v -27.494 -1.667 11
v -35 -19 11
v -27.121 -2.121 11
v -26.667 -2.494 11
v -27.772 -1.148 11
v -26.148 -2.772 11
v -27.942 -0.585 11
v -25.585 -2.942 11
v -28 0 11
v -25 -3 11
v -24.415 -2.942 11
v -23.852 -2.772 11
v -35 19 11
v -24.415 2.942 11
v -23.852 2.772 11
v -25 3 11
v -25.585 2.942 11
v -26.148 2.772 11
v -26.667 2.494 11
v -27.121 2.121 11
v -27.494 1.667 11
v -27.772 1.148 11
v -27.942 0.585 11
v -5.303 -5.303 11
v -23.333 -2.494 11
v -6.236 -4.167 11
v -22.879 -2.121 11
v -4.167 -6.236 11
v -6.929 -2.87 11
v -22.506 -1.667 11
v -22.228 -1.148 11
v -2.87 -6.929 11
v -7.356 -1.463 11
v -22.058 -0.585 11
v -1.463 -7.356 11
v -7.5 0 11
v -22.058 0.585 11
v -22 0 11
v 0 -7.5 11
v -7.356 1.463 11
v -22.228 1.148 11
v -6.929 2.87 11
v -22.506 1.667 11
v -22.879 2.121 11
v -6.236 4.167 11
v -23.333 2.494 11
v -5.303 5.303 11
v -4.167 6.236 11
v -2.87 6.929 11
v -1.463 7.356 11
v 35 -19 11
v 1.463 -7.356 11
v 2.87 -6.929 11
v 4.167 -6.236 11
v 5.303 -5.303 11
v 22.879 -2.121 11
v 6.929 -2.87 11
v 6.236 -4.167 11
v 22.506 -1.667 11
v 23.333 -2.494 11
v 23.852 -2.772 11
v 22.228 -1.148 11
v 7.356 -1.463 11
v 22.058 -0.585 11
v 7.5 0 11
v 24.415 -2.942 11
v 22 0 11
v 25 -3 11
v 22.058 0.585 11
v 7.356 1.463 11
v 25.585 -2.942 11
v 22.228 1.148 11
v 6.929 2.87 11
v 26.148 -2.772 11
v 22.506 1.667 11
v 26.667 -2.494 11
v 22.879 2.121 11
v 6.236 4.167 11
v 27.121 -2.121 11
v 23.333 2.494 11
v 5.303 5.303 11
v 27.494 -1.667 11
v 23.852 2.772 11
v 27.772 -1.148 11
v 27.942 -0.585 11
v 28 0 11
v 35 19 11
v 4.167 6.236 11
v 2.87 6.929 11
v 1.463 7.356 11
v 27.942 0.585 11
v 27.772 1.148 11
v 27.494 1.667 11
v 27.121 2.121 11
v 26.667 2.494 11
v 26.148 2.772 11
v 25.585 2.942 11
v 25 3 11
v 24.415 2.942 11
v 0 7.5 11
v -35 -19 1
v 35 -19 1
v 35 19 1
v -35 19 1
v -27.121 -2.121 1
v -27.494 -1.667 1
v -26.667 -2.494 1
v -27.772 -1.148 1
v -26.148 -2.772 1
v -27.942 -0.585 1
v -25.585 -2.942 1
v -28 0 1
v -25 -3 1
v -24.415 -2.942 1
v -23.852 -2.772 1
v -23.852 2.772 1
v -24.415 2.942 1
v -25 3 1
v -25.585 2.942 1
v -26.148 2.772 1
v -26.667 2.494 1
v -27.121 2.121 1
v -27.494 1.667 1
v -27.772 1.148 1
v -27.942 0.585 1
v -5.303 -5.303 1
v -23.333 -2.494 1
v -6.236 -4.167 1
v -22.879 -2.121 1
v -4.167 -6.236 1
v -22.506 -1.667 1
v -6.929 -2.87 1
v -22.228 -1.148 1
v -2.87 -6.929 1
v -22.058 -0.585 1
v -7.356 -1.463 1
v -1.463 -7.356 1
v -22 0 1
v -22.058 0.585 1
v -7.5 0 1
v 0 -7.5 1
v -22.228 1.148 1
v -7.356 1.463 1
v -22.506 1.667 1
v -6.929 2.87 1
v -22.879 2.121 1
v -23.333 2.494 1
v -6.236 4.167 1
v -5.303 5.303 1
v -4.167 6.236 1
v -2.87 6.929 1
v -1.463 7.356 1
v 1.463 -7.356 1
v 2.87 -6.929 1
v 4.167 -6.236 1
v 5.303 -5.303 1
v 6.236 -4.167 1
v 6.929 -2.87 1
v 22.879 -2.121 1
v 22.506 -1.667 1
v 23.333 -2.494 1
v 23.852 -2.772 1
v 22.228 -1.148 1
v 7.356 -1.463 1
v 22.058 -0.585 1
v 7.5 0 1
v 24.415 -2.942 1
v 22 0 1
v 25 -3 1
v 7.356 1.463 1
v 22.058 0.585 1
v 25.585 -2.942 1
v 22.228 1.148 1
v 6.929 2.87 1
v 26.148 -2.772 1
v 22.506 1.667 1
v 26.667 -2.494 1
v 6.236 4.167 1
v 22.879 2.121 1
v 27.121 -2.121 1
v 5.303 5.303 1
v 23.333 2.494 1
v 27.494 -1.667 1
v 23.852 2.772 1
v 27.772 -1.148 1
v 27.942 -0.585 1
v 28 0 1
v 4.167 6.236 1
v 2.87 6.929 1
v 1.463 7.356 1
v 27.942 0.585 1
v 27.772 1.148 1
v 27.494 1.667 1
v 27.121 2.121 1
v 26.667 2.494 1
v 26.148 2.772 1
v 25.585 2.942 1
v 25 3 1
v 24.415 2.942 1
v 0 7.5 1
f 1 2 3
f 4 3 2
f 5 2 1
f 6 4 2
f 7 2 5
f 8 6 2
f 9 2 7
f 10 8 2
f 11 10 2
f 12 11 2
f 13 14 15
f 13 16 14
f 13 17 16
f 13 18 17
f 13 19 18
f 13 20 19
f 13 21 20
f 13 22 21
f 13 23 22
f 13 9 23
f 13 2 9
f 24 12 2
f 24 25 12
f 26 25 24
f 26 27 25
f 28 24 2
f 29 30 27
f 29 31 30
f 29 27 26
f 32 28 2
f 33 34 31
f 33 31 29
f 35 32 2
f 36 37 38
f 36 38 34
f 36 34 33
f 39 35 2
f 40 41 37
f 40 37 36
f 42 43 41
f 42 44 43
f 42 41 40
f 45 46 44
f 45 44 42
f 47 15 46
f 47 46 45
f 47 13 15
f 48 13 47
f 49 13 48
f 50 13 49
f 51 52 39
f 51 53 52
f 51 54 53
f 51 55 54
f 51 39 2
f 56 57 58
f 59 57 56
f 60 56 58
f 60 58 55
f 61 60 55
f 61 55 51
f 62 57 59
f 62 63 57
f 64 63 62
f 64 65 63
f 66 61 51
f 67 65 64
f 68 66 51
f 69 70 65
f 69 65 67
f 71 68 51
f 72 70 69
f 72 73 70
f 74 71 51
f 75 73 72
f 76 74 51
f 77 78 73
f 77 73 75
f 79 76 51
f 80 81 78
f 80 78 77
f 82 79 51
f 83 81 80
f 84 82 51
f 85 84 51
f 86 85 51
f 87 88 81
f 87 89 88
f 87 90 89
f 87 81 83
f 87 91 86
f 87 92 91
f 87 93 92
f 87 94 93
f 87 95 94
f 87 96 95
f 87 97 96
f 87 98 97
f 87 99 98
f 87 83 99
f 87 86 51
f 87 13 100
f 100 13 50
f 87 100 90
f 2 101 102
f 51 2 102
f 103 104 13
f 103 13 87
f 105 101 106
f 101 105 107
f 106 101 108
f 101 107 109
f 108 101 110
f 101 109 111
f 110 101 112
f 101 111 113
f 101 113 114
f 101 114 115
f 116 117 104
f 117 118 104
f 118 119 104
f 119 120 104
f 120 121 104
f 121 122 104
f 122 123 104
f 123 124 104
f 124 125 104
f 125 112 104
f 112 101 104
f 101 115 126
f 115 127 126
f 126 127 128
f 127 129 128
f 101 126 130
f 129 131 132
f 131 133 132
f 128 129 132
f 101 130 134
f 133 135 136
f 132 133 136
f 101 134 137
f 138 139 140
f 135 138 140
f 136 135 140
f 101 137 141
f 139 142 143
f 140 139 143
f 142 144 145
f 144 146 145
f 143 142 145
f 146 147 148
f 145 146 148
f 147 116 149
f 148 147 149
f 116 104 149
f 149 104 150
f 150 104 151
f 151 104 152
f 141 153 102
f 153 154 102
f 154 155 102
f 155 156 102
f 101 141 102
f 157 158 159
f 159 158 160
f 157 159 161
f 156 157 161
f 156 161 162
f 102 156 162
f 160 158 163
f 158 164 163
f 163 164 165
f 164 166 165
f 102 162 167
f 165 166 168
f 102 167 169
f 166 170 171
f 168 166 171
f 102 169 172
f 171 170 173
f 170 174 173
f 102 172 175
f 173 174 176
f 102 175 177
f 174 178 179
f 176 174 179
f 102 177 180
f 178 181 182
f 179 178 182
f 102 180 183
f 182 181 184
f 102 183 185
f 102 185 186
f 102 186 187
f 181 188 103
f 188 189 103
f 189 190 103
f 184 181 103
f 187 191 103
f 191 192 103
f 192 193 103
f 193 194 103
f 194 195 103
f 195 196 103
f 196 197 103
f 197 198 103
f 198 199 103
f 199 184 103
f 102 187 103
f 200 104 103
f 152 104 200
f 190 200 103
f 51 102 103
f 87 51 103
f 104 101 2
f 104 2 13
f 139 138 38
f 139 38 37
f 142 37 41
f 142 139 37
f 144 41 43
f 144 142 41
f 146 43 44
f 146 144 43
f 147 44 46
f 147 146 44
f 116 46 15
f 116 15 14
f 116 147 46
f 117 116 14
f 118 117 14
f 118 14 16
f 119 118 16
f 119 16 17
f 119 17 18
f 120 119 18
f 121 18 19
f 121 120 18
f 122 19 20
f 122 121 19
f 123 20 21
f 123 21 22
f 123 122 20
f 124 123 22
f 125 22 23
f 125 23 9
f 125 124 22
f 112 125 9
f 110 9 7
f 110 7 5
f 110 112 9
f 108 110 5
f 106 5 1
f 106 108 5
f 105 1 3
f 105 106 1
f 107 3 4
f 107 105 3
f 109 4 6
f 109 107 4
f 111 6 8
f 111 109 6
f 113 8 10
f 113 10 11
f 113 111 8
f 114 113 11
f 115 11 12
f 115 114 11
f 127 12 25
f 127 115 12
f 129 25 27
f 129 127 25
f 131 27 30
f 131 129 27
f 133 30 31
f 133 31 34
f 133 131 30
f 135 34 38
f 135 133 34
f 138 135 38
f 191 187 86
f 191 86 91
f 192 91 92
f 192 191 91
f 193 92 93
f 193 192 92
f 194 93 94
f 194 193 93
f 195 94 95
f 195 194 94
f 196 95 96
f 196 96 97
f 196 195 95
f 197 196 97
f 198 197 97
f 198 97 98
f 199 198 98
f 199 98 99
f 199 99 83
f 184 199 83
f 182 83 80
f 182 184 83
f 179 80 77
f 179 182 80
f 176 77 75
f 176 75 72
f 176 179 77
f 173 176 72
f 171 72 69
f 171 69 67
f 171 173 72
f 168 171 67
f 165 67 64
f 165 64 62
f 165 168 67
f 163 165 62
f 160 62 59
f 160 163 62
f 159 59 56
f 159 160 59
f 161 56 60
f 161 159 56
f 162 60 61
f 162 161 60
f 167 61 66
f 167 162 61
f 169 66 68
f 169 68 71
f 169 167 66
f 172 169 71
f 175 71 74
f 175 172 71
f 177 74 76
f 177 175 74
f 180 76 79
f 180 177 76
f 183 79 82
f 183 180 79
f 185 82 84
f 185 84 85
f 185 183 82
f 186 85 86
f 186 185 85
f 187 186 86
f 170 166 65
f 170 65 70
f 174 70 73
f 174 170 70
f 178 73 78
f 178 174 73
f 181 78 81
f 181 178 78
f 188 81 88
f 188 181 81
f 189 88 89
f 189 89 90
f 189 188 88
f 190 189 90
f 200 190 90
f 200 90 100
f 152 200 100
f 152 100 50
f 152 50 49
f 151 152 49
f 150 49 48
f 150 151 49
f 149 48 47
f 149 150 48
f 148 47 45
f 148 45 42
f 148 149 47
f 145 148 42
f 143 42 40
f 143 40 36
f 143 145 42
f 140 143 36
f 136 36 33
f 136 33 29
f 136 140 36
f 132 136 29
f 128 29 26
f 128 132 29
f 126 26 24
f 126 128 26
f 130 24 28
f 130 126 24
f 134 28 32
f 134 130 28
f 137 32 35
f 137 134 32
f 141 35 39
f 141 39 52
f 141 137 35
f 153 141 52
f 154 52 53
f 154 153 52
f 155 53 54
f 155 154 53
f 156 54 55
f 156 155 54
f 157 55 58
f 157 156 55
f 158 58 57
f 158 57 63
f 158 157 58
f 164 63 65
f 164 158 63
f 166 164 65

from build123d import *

# Parameters (mm, degrees)
CYLINDER004_R     = 7.5
CYLINDER004_DEPTH = 10
CYLINDER003_R     = 3
CYLINDER003_DEPTH = 10
ARRAY001_X_COUNT  = 2
ARRAY001_X_PITCH  = 50
RECTANGLE001_W    = 70
RECTANGLE001_H    = 38
EXTRUDE001_DEPTH  = 10


with BuildPart() as cilindro004:
    # Cylinder004 → Cylinder004 (new body)
    with BuildSketch(Plane(origin=(0, -5, 0), x_dir=(1, 0, 0), z_dir=(0, 0, 1))):
        Circle(CYLINDER004_R)
    extrude(amount=CYLINDER004_DEPTH)


with BuildPart() as fusion:
    # Cylinder003 → Cylinder003 (new body)
    with BuildSketch(Plane(origin=(25, -5, 0), x_dir=(1, 0, 0), z_dir=(0, 0, 1))):
        Circle(CYLINDER003_R)
    extrude(amount=CYLINDER003_DEPTH)

    # Array001 X: Fusion ×2


with BuildPart() as fusion_1:
    add(fusion.part)
    with Locations(*[(-i * ARRAY001_X_PITCH, 0, 0) for i in range(1, ARRAY001_X_COUNT)]):
        add(fusion.part)

    # Fusion: union Cilindro004
    add(cilindro004.part)


with BuildPart() as x_carr:
    # Rectangle001 → Extrude001 (new body)
    with BuildSketch(Plane(origin=(-35, -24, 0), x_dir=(1, 0, 0), z_dir=(0, 0, 1))):
        with Locations((35, 19)):
            Rectangle(RECTANGLE001_W, RECTANGLE001_H)
    extrude(amount=EXTRUDE001_DEPTH)

    # Cut003: cut Fusion
    add(fusion_1.part, mode=Mode.SUBTRACT)


with BuildPart() as x_carr_1:
    # Cut003 placement: moved
    add(x_carr.part.moved(Location((0, 5, 1))))


solid = x_carr_1.part
